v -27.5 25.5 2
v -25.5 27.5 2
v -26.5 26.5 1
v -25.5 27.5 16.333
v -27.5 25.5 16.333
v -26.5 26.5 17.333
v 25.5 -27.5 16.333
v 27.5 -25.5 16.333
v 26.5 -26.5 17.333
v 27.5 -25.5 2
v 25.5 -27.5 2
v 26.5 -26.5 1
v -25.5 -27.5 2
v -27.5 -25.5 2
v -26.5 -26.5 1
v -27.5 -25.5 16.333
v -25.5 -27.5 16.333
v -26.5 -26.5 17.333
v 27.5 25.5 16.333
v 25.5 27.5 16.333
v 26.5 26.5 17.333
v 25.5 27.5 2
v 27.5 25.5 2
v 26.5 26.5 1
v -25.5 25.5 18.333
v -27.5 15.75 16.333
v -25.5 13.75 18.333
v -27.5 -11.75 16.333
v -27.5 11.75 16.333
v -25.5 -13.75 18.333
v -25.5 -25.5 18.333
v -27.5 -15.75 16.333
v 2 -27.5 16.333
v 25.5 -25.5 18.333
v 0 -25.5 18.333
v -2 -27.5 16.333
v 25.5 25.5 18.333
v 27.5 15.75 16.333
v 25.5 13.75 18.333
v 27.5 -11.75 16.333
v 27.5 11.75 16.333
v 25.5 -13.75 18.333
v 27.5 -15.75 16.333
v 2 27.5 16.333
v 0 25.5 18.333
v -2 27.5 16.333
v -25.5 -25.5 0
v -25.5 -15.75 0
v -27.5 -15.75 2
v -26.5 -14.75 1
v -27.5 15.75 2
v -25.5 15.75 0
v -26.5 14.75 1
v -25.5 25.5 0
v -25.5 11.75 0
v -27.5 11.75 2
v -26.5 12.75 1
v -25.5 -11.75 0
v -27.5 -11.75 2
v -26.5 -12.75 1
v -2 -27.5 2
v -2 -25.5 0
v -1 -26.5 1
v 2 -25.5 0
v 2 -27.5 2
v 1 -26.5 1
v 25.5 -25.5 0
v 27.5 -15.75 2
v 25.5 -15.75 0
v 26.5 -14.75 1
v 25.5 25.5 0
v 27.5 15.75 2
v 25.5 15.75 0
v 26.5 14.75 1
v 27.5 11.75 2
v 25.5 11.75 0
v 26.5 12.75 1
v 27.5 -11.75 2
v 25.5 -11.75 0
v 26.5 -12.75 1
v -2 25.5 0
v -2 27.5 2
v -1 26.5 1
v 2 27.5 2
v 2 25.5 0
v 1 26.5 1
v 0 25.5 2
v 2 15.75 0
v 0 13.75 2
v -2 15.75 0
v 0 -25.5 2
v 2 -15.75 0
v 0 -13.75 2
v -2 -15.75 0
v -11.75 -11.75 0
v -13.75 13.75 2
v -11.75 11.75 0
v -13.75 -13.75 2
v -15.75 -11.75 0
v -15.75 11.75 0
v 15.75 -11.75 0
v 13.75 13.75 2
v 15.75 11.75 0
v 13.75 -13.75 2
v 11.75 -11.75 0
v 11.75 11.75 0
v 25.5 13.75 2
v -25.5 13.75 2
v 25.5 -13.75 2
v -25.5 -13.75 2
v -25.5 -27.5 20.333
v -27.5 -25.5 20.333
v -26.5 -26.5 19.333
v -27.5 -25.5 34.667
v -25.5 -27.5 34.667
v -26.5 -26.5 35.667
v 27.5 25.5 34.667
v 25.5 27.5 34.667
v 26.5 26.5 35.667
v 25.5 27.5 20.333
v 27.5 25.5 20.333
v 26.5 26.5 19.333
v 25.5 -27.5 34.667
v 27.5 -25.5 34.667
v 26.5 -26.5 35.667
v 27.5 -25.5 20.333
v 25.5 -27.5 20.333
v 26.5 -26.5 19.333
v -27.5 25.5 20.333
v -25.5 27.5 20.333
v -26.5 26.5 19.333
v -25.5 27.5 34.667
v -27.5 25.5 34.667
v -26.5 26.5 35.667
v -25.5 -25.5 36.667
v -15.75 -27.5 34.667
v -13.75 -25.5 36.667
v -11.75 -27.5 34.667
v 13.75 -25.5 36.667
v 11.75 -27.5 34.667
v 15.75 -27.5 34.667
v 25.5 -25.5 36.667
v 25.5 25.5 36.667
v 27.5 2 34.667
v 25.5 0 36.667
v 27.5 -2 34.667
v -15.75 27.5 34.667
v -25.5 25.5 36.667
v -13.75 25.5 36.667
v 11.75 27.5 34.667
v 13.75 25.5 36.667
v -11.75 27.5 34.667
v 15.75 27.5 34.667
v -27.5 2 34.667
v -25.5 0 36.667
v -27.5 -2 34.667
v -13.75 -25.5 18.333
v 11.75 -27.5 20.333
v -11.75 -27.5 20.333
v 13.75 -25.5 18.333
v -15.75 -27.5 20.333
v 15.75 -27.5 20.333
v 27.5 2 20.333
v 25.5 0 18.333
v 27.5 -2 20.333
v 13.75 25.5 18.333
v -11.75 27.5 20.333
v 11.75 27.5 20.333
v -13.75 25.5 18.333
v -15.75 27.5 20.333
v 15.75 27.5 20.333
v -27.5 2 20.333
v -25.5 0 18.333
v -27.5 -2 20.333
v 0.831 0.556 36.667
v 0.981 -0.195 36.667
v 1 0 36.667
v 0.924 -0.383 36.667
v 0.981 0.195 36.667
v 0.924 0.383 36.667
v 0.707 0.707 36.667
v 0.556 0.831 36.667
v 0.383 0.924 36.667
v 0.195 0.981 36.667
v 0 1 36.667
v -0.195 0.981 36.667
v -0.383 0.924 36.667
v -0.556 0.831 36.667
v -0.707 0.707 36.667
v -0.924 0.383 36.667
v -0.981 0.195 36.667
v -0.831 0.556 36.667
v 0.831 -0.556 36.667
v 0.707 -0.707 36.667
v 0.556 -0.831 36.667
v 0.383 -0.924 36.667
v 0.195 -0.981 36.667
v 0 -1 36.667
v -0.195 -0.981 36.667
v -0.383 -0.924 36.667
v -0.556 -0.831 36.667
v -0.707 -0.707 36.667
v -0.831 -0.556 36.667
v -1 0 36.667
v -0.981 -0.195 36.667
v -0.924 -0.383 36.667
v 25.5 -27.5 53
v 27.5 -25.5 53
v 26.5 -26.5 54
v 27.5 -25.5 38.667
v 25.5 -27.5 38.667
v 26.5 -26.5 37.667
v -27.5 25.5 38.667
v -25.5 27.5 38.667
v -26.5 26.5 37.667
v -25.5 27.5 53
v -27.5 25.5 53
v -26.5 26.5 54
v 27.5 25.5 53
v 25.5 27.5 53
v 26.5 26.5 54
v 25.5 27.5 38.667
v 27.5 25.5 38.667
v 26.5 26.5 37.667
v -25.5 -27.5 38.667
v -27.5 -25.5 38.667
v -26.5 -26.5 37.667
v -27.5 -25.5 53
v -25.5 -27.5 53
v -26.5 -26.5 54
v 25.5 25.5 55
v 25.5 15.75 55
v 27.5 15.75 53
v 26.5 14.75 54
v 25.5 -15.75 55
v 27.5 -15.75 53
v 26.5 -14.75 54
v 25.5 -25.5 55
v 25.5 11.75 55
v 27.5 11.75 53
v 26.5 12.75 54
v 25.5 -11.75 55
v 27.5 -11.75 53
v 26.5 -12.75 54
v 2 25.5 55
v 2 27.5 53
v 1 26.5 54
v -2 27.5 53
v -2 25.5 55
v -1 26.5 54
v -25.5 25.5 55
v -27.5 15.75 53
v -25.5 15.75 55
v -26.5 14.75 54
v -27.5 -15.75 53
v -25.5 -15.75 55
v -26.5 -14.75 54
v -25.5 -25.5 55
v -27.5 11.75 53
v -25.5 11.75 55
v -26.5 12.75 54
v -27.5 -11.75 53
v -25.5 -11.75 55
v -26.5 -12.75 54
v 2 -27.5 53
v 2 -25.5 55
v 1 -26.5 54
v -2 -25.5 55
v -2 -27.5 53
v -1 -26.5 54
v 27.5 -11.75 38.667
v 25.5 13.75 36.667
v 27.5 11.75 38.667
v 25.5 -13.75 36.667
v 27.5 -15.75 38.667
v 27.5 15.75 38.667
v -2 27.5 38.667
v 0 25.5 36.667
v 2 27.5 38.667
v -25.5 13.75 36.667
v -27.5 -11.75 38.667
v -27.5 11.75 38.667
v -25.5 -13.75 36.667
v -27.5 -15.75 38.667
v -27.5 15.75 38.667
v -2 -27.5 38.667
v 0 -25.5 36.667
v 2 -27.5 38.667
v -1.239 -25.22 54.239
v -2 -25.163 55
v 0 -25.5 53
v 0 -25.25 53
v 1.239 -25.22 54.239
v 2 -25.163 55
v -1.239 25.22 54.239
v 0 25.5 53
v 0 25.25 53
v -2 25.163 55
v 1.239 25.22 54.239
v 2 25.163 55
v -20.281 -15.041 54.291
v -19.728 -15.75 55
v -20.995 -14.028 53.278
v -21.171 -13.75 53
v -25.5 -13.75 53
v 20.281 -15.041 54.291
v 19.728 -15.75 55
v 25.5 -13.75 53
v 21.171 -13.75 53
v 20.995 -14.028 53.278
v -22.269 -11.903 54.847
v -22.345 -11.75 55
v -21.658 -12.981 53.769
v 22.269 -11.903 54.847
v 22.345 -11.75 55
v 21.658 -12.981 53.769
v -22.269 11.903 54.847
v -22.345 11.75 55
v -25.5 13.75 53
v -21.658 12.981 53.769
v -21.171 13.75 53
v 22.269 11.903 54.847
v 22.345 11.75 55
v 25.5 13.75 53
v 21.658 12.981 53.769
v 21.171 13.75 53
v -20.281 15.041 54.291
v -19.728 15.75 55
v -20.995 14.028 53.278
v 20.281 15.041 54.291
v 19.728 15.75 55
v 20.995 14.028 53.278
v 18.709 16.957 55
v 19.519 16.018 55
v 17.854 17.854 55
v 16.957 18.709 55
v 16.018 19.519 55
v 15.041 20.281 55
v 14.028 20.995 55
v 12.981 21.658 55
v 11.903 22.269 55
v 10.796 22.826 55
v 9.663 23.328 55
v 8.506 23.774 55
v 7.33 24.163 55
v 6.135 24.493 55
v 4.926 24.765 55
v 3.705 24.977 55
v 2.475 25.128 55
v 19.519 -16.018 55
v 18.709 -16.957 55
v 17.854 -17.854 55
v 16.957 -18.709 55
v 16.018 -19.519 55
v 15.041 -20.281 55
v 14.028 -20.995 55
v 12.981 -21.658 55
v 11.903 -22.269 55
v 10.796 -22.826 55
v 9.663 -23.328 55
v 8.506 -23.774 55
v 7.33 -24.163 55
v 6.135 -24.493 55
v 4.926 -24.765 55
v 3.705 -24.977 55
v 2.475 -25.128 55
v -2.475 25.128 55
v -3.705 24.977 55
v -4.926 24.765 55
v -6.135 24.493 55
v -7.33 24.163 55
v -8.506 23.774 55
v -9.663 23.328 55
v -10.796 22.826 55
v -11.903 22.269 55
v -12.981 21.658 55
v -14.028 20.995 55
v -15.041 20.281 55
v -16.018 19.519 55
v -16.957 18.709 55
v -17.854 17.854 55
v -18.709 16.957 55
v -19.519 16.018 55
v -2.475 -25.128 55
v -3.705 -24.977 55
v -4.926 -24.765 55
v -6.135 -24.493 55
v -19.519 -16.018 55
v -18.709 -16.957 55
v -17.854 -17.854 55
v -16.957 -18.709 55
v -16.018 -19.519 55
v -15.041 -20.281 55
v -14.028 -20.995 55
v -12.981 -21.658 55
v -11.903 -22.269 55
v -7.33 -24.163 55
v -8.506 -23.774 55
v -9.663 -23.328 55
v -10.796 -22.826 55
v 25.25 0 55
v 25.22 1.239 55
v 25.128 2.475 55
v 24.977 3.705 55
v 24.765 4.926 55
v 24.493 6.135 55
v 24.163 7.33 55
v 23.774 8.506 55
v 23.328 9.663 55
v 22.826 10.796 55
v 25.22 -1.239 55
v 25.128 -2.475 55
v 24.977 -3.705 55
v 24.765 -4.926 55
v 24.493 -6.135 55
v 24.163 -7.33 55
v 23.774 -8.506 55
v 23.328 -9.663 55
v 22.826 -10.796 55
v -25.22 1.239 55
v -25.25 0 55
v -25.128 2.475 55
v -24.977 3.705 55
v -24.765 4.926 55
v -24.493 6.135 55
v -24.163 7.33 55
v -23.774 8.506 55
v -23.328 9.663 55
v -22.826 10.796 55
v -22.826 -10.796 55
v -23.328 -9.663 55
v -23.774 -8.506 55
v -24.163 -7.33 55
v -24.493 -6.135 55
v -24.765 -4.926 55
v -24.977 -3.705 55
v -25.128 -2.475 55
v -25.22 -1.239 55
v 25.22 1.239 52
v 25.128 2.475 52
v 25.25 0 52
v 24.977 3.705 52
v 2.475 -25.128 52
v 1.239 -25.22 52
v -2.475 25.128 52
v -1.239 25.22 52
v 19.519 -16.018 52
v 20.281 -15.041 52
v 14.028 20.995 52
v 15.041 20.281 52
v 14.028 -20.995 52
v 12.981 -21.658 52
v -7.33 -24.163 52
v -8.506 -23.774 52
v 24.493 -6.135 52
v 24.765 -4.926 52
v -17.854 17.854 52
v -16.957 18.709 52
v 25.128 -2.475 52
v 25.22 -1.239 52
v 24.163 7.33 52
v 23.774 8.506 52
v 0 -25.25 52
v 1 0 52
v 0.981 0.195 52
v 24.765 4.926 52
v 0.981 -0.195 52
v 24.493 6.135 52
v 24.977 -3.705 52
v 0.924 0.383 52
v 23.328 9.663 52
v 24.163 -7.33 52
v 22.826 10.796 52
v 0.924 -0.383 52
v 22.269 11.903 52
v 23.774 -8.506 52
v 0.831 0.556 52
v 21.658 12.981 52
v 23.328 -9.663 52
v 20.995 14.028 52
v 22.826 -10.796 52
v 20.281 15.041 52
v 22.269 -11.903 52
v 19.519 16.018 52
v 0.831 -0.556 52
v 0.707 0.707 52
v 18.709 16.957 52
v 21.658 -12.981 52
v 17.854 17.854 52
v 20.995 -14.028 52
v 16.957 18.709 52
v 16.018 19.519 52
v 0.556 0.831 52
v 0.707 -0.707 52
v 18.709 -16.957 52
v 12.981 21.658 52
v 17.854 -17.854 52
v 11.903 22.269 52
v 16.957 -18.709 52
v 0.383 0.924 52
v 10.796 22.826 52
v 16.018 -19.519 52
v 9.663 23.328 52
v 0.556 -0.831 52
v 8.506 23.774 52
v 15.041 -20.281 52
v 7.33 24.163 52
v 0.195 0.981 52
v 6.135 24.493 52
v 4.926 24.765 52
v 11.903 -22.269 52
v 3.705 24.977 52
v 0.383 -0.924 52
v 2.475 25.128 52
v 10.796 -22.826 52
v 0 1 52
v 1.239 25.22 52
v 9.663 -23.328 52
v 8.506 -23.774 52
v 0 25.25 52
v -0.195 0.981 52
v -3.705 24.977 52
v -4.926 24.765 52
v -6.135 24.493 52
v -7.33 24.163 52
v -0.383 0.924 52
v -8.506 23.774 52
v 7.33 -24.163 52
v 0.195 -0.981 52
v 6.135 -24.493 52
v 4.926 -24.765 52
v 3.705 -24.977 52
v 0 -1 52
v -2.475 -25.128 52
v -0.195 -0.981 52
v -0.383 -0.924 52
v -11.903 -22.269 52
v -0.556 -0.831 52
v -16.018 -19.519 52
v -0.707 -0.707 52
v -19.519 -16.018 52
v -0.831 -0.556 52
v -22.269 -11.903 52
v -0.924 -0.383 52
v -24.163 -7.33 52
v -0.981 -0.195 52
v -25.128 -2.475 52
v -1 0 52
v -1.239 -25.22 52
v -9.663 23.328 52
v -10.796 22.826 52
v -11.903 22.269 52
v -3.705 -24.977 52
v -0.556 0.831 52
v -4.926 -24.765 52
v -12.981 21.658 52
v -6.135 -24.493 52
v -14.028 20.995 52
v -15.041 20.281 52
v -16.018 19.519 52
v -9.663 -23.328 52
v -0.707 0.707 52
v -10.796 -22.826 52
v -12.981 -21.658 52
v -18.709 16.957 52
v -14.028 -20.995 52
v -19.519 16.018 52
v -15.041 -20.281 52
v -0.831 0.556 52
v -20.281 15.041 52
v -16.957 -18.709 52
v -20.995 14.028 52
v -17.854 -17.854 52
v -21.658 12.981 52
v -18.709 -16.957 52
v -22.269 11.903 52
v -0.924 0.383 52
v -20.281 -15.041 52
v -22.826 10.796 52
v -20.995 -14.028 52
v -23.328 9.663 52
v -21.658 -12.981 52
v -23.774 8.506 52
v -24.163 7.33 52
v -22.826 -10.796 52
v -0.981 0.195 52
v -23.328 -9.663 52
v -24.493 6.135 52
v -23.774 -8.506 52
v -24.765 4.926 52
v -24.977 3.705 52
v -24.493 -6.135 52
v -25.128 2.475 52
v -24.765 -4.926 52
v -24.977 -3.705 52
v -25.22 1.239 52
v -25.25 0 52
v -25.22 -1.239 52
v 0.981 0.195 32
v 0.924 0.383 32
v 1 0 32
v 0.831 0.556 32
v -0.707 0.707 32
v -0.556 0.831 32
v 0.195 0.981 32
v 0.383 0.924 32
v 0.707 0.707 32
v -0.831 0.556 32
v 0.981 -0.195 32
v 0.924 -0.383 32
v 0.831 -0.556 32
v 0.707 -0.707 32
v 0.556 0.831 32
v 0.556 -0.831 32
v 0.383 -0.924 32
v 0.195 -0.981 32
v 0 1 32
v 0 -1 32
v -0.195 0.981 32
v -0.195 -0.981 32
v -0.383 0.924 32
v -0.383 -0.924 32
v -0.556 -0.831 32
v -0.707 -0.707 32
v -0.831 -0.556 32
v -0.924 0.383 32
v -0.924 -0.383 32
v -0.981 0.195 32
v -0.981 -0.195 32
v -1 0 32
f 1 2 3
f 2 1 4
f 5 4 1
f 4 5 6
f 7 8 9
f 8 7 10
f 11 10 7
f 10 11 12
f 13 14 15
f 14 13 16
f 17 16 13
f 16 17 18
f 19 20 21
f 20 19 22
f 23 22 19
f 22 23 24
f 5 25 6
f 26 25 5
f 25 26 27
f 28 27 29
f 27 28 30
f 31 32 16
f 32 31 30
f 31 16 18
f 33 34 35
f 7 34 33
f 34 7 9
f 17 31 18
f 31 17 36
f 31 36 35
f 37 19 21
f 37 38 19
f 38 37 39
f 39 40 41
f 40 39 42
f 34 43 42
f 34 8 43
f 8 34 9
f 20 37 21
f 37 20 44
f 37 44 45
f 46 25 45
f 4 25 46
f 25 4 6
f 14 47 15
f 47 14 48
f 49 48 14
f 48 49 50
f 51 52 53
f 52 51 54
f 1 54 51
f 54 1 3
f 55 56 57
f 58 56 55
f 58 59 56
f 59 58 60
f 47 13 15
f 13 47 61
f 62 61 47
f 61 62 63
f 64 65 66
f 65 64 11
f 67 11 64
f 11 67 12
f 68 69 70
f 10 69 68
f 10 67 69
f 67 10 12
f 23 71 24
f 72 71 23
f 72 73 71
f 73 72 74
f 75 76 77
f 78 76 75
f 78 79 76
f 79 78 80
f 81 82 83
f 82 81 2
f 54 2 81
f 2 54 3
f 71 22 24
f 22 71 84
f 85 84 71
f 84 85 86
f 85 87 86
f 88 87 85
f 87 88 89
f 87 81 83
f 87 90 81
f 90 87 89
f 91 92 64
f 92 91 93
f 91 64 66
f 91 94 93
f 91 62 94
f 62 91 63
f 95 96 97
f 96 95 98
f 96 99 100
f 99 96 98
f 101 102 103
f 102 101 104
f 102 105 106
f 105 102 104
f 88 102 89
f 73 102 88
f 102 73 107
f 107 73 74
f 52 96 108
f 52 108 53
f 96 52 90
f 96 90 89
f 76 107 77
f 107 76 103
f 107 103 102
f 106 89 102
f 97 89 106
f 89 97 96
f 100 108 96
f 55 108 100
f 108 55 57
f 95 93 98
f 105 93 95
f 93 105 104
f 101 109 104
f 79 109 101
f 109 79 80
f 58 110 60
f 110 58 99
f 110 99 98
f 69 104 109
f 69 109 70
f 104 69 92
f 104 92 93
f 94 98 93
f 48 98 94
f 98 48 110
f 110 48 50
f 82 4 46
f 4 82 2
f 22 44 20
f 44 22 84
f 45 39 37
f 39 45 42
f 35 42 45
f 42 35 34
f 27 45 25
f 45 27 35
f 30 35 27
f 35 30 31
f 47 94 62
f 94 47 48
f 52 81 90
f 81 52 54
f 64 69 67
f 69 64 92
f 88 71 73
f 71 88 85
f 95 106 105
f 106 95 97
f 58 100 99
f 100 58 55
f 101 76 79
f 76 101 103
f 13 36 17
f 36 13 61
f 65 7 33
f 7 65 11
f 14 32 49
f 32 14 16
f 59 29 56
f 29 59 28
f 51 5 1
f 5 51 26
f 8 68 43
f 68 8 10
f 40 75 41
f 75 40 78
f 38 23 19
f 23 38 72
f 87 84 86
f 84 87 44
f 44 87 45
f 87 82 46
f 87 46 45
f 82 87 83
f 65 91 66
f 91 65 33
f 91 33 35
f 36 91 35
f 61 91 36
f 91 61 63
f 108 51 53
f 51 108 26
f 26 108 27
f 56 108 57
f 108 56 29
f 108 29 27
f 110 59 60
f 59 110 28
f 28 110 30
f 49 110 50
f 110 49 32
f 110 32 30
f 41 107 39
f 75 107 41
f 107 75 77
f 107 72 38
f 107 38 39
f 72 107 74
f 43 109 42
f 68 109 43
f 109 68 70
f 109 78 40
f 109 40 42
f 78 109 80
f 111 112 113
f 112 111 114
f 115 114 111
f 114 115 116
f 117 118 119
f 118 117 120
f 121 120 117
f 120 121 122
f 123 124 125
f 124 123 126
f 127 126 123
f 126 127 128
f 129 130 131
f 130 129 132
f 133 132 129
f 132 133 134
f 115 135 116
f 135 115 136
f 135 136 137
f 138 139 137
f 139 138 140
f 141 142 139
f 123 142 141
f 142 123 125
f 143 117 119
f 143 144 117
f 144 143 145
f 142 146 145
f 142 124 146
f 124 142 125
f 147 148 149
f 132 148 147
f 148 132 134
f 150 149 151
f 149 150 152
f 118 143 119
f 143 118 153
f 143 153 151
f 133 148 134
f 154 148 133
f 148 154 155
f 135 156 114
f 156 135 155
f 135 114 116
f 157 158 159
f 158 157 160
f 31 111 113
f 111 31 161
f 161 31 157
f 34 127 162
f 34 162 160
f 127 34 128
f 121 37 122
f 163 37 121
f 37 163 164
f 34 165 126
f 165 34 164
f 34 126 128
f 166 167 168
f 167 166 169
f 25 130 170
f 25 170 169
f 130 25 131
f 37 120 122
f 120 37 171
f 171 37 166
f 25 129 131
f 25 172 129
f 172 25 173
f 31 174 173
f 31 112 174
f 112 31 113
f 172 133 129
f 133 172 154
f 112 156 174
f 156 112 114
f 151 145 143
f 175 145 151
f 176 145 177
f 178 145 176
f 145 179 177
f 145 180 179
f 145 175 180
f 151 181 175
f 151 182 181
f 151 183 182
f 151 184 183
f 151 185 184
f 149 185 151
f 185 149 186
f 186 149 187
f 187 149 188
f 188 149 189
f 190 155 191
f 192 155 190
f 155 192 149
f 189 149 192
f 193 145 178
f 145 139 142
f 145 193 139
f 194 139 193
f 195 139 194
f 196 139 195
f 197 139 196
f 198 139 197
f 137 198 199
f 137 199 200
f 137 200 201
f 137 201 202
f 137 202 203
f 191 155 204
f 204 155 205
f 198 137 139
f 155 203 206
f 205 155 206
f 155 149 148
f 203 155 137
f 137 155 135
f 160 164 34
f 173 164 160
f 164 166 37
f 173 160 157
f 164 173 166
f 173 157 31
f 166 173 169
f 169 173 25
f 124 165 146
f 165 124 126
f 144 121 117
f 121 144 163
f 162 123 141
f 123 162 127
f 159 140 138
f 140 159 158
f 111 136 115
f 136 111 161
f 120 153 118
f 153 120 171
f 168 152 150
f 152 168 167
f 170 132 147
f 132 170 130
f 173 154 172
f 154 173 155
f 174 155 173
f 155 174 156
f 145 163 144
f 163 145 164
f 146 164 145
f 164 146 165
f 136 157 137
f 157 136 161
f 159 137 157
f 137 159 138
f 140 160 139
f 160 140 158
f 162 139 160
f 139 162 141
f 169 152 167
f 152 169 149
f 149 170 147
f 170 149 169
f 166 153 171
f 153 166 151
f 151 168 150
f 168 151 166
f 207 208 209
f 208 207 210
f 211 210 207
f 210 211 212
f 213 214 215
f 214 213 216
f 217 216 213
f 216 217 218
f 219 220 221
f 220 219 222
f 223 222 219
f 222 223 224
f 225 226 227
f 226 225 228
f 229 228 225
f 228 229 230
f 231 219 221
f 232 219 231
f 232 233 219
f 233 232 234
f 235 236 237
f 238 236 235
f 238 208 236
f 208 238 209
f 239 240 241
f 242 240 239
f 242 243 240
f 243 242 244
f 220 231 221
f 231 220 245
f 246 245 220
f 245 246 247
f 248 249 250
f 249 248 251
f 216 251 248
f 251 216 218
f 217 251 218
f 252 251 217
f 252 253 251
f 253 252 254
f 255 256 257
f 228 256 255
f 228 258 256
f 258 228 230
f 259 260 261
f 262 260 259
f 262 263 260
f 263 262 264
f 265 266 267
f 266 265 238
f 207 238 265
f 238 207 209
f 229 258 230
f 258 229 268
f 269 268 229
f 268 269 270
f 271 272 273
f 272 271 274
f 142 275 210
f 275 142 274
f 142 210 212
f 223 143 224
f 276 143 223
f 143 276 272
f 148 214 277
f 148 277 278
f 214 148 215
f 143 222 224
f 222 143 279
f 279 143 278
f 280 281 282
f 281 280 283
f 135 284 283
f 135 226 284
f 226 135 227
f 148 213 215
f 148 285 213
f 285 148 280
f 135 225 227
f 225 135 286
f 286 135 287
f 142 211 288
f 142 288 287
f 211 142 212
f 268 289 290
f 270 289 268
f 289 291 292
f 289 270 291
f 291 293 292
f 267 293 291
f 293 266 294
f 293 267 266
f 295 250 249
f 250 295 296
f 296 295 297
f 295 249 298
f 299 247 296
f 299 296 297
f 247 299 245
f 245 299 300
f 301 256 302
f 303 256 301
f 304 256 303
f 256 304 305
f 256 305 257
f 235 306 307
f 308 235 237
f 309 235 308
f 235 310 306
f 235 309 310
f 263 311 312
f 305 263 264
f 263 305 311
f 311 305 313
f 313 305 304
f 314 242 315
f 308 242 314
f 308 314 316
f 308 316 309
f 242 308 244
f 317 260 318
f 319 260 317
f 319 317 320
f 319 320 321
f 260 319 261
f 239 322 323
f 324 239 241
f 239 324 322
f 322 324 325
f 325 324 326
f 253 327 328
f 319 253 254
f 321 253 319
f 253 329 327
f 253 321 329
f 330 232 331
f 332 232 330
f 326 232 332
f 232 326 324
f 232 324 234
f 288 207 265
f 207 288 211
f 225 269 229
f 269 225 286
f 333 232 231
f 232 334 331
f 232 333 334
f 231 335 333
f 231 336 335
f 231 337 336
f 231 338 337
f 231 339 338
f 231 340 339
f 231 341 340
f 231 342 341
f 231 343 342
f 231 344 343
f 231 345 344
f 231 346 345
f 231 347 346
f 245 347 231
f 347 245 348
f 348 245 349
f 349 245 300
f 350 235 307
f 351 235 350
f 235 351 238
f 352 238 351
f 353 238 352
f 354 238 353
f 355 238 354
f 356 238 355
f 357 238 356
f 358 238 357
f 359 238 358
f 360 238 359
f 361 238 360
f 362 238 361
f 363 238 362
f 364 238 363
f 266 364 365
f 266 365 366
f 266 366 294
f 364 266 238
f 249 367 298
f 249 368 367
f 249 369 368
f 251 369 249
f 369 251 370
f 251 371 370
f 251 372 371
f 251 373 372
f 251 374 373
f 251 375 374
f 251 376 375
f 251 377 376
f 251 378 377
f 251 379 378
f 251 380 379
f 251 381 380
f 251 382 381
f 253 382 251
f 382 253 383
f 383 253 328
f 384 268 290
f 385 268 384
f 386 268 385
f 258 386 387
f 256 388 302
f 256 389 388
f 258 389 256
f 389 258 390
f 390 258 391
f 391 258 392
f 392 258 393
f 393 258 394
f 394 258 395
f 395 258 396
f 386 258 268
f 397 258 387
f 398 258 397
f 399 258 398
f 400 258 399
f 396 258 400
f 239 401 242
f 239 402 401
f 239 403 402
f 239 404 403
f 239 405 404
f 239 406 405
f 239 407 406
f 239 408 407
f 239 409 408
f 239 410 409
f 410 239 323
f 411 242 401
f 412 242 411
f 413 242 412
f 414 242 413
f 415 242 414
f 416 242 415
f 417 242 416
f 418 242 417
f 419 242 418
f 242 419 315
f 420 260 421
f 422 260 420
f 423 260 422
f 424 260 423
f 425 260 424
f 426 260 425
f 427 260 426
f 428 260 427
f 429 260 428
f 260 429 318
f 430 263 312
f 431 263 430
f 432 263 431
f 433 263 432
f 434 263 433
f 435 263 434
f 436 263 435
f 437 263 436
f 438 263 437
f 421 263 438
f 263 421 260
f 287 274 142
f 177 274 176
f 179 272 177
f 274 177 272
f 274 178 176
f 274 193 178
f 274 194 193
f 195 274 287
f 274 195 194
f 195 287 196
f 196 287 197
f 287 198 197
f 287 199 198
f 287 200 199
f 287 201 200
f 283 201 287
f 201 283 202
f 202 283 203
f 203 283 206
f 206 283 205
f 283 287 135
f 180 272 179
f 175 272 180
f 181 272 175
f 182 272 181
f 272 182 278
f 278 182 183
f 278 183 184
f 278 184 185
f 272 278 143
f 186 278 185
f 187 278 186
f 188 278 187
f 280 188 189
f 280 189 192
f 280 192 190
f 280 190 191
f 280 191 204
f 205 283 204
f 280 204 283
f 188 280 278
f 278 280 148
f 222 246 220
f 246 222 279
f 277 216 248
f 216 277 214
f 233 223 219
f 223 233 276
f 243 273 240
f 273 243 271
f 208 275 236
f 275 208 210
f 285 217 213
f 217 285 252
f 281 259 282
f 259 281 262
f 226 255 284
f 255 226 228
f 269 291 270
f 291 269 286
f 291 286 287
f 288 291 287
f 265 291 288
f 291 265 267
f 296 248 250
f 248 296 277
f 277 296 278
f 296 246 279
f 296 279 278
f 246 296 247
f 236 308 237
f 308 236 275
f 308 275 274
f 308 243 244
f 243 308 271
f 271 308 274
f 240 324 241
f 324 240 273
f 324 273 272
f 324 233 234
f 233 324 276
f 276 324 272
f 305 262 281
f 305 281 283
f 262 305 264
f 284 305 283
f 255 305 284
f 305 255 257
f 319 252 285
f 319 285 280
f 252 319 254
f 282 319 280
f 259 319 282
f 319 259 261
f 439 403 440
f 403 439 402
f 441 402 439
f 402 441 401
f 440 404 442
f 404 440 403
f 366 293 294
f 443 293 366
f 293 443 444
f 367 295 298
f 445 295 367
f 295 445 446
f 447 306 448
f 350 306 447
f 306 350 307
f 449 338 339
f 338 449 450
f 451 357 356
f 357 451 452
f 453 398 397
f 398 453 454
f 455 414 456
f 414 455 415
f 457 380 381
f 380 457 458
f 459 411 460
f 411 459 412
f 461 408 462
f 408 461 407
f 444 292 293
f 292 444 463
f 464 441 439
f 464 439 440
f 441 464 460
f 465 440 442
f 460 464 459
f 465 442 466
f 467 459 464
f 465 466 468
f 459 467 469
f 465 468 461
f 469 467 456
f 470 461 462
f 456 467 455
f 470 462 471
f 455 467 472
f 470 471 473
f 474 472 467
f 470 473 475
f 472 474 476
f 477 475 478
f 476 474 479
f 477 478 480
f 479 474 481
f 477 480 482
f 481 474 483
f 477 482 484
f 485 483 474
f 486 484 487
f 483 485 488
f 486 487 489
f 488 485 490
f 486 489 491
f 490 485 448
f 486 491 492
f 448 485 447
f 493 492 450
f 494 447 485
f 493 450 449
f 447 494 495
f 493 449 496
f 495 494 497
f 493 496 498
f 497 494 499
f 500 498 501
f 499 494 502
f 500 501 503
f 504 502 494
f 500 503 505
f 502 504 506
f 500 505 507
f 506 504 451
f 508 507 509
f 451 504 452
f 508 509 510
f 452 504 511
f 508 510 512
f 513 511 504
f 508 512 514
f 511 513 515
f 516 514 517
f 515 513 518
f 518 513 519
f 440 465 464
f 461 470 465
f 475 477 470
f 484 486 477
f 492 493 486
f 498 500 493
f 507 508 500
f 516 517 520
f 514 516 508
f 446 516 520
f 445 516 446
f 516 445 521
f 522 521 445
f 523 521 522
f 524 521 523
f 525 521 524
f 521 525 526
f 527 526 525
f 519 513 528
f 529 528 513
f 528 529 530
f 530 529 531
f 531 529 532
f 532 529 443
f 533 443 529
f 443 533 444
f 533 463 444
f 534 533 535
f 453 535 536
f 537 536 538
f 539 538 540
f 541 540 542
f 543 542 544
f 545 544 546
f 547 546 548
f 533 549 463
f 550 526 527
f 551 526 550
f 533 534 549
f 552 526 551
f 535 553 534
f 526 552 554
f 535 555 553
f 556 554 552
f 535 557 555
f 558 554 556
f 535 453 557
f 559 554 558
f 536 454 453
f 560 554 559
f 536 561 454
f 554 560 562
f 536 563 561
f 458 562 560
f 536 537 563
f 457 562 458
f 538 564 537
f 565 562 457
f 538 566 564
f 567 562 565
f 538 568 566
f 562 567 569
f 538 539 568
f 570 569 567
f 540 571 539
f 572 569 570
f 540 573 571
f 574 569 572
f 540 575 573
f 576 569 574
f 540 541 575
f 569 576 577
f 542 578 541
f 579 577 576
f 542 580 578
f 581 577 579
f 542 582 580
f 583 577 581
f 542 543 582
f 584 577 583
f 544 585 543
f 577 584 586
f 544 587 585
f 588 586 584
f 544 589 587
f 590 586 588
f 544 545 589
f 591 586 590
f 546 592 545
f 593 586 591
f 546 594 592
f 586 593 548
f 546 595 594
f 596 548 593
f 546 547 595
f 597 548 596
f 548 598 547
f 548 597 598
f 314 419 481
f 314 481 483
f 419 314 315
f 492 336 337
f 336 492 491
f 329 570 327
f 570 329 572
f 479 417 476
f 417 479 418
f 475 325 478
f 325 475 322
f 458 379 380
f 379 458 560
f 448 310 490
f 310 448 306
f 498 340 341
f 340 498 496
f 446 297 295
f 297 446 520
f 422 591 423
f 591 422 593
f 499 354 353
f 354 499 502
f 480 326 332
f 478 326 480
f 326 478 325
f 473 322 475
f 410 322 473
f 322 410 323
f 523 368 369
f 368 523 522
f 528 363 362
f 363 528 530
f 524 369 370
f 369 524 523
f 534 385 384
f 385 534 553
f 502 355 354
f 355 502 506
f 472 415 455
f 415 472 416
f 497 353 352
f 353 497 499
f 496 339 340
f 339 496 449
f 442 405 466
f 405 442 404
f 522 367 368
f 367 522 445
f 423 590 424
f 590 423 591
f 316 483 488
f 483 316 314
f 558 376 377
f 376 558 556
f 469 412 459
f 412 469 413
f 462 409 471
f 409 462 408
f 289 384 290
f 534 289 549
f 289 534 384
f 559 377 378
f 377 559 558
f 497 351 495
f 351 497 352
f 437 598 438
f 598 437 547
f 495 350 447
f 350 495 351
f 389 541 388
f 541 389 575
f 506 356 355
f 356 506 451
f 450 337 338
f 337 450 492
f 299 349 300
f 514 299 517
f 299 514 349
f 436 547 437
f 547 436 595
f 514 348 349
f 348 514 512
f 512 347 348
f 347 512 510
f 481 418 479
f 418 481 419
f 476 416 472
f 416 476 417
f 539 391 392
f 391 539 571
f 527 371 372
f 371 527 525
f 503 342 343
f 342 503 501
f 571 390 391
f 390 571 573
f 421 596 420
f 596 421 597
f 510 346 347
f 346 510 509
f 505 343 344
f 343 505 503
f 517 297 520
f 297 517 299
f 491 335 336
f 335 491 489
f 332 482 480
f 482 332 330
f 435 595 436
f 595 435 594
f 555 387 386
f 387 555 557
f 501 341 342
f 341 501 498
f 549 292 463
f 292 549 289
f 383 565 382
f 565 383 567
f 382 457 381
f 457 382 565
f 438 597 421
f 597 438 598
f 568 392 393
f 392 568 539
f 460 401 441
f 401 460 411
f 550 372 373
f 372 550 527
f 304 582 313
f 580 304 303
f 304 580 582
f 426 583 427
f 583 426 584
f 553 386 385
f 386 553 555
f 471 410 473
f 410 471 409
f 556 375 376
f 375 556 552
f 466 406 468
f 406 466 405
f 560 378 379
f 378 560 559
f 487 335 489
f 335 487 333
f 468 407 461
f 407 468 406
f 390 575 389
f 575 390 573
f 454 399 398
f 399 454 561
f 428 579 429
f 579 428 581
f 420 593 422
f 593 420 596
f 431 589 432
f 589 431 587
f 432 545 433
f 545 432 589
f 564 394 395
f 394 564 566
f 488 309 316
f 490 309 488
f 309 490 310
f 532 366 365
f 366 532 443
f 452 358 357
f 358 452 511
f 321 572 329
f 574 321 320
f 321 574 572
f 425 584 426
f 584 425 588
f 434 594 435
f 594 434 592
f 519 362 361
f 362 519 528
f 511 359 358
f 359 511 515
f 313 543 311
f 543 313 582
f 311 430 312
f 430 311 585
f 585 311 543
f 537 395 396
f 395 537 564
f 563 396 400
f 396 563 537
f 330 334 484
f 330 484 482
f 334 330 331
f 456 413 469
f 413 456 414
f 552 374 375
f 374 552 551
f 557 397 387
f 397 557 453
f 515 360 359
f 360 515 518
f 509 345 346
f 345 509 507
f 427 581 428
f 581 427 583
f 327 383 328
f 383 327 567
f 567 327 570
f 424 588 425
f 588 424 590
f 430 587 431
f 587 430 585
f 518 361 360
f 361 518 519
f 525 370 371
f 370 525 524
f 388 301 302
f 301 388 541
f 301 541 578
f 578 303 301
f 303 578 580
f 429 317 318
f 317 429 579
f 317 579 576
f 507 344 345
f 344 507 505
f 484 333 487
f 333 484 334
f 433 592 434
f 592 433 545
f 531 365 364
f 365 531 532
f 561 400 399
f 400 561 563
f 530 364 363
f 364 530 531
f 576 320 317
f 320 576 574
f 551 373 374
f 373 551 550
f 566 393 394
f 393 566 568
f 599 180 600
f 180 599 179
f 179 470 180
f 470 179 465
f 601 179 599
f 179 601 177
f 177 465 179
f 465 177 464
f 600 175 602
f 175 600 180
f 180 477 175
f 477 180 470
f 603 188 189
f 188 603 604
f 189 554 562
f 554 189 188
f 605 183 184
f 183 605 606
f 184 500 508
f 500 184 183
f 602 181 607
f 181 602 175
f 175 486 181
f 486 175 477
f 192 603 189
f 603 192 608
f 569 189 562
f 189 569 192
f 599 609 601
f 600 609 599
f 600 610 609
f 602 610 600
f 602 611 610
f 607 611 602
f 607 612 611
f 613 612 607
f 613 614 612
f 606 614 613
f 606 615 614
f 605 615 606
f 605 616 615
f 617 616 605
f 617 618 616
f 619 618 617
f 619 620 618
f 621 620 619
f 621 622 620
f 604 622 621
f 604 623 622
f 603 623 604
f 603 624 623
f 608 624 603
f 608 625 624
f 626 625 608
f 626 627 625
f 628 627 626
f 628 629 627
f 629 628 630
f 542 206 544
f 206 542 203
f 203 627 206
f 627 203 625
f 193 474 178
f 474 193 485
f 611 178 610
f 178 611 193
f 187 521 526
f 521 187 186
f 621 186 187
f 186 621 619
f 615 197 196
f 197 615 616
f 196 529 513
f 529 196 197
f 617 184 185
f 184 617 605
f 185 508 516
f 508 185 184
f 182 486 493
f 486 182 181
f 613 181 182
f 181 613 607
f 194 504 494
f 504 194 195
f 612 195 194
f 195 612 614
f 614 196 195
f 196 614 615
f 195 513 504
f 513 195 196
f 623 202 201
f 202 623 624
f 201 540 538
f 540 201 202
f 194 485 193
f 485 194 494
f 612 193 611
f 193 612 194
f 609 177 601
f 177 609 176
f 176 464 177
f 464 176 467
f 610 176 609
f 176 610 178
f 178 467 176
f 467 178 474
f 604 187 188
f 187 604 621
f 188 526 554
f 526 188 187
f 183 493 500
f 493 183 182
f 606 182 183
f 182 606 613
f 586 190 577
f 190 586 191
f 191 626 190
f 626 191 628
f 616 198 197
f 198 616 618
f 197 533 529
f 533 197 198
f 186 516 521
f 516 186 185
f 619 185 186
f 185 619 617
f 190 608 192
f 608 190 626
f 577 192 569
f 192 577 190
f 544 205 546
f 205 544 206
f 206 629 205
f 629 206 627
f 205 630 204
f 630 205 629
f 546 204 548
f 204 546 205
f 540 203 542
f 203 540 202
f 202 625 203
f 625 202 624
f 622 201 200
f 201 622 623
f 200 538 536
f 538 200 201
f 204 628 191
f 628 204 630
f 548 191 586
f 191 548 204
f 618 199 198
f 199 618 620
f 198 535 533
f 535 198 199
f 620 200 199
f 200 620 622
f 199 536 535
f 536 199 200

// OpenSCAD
use <Brick_Block_Box.scad>;

stove_d=50.5;
stove_h=3;
brick_x=55;

stick_d=2;
stick_h=20;

difference(){
  Brick_Block_Box(brick_x);

  translate([0,0,brick_x-stove_h])
  cylinder(d=stove_d, h=stove_h, $fn=128);

  translate([0,0,brick_x-stick_h-stove_h])
  cylinder(d=stick_d, h=stick_h, $fn=32);
}
